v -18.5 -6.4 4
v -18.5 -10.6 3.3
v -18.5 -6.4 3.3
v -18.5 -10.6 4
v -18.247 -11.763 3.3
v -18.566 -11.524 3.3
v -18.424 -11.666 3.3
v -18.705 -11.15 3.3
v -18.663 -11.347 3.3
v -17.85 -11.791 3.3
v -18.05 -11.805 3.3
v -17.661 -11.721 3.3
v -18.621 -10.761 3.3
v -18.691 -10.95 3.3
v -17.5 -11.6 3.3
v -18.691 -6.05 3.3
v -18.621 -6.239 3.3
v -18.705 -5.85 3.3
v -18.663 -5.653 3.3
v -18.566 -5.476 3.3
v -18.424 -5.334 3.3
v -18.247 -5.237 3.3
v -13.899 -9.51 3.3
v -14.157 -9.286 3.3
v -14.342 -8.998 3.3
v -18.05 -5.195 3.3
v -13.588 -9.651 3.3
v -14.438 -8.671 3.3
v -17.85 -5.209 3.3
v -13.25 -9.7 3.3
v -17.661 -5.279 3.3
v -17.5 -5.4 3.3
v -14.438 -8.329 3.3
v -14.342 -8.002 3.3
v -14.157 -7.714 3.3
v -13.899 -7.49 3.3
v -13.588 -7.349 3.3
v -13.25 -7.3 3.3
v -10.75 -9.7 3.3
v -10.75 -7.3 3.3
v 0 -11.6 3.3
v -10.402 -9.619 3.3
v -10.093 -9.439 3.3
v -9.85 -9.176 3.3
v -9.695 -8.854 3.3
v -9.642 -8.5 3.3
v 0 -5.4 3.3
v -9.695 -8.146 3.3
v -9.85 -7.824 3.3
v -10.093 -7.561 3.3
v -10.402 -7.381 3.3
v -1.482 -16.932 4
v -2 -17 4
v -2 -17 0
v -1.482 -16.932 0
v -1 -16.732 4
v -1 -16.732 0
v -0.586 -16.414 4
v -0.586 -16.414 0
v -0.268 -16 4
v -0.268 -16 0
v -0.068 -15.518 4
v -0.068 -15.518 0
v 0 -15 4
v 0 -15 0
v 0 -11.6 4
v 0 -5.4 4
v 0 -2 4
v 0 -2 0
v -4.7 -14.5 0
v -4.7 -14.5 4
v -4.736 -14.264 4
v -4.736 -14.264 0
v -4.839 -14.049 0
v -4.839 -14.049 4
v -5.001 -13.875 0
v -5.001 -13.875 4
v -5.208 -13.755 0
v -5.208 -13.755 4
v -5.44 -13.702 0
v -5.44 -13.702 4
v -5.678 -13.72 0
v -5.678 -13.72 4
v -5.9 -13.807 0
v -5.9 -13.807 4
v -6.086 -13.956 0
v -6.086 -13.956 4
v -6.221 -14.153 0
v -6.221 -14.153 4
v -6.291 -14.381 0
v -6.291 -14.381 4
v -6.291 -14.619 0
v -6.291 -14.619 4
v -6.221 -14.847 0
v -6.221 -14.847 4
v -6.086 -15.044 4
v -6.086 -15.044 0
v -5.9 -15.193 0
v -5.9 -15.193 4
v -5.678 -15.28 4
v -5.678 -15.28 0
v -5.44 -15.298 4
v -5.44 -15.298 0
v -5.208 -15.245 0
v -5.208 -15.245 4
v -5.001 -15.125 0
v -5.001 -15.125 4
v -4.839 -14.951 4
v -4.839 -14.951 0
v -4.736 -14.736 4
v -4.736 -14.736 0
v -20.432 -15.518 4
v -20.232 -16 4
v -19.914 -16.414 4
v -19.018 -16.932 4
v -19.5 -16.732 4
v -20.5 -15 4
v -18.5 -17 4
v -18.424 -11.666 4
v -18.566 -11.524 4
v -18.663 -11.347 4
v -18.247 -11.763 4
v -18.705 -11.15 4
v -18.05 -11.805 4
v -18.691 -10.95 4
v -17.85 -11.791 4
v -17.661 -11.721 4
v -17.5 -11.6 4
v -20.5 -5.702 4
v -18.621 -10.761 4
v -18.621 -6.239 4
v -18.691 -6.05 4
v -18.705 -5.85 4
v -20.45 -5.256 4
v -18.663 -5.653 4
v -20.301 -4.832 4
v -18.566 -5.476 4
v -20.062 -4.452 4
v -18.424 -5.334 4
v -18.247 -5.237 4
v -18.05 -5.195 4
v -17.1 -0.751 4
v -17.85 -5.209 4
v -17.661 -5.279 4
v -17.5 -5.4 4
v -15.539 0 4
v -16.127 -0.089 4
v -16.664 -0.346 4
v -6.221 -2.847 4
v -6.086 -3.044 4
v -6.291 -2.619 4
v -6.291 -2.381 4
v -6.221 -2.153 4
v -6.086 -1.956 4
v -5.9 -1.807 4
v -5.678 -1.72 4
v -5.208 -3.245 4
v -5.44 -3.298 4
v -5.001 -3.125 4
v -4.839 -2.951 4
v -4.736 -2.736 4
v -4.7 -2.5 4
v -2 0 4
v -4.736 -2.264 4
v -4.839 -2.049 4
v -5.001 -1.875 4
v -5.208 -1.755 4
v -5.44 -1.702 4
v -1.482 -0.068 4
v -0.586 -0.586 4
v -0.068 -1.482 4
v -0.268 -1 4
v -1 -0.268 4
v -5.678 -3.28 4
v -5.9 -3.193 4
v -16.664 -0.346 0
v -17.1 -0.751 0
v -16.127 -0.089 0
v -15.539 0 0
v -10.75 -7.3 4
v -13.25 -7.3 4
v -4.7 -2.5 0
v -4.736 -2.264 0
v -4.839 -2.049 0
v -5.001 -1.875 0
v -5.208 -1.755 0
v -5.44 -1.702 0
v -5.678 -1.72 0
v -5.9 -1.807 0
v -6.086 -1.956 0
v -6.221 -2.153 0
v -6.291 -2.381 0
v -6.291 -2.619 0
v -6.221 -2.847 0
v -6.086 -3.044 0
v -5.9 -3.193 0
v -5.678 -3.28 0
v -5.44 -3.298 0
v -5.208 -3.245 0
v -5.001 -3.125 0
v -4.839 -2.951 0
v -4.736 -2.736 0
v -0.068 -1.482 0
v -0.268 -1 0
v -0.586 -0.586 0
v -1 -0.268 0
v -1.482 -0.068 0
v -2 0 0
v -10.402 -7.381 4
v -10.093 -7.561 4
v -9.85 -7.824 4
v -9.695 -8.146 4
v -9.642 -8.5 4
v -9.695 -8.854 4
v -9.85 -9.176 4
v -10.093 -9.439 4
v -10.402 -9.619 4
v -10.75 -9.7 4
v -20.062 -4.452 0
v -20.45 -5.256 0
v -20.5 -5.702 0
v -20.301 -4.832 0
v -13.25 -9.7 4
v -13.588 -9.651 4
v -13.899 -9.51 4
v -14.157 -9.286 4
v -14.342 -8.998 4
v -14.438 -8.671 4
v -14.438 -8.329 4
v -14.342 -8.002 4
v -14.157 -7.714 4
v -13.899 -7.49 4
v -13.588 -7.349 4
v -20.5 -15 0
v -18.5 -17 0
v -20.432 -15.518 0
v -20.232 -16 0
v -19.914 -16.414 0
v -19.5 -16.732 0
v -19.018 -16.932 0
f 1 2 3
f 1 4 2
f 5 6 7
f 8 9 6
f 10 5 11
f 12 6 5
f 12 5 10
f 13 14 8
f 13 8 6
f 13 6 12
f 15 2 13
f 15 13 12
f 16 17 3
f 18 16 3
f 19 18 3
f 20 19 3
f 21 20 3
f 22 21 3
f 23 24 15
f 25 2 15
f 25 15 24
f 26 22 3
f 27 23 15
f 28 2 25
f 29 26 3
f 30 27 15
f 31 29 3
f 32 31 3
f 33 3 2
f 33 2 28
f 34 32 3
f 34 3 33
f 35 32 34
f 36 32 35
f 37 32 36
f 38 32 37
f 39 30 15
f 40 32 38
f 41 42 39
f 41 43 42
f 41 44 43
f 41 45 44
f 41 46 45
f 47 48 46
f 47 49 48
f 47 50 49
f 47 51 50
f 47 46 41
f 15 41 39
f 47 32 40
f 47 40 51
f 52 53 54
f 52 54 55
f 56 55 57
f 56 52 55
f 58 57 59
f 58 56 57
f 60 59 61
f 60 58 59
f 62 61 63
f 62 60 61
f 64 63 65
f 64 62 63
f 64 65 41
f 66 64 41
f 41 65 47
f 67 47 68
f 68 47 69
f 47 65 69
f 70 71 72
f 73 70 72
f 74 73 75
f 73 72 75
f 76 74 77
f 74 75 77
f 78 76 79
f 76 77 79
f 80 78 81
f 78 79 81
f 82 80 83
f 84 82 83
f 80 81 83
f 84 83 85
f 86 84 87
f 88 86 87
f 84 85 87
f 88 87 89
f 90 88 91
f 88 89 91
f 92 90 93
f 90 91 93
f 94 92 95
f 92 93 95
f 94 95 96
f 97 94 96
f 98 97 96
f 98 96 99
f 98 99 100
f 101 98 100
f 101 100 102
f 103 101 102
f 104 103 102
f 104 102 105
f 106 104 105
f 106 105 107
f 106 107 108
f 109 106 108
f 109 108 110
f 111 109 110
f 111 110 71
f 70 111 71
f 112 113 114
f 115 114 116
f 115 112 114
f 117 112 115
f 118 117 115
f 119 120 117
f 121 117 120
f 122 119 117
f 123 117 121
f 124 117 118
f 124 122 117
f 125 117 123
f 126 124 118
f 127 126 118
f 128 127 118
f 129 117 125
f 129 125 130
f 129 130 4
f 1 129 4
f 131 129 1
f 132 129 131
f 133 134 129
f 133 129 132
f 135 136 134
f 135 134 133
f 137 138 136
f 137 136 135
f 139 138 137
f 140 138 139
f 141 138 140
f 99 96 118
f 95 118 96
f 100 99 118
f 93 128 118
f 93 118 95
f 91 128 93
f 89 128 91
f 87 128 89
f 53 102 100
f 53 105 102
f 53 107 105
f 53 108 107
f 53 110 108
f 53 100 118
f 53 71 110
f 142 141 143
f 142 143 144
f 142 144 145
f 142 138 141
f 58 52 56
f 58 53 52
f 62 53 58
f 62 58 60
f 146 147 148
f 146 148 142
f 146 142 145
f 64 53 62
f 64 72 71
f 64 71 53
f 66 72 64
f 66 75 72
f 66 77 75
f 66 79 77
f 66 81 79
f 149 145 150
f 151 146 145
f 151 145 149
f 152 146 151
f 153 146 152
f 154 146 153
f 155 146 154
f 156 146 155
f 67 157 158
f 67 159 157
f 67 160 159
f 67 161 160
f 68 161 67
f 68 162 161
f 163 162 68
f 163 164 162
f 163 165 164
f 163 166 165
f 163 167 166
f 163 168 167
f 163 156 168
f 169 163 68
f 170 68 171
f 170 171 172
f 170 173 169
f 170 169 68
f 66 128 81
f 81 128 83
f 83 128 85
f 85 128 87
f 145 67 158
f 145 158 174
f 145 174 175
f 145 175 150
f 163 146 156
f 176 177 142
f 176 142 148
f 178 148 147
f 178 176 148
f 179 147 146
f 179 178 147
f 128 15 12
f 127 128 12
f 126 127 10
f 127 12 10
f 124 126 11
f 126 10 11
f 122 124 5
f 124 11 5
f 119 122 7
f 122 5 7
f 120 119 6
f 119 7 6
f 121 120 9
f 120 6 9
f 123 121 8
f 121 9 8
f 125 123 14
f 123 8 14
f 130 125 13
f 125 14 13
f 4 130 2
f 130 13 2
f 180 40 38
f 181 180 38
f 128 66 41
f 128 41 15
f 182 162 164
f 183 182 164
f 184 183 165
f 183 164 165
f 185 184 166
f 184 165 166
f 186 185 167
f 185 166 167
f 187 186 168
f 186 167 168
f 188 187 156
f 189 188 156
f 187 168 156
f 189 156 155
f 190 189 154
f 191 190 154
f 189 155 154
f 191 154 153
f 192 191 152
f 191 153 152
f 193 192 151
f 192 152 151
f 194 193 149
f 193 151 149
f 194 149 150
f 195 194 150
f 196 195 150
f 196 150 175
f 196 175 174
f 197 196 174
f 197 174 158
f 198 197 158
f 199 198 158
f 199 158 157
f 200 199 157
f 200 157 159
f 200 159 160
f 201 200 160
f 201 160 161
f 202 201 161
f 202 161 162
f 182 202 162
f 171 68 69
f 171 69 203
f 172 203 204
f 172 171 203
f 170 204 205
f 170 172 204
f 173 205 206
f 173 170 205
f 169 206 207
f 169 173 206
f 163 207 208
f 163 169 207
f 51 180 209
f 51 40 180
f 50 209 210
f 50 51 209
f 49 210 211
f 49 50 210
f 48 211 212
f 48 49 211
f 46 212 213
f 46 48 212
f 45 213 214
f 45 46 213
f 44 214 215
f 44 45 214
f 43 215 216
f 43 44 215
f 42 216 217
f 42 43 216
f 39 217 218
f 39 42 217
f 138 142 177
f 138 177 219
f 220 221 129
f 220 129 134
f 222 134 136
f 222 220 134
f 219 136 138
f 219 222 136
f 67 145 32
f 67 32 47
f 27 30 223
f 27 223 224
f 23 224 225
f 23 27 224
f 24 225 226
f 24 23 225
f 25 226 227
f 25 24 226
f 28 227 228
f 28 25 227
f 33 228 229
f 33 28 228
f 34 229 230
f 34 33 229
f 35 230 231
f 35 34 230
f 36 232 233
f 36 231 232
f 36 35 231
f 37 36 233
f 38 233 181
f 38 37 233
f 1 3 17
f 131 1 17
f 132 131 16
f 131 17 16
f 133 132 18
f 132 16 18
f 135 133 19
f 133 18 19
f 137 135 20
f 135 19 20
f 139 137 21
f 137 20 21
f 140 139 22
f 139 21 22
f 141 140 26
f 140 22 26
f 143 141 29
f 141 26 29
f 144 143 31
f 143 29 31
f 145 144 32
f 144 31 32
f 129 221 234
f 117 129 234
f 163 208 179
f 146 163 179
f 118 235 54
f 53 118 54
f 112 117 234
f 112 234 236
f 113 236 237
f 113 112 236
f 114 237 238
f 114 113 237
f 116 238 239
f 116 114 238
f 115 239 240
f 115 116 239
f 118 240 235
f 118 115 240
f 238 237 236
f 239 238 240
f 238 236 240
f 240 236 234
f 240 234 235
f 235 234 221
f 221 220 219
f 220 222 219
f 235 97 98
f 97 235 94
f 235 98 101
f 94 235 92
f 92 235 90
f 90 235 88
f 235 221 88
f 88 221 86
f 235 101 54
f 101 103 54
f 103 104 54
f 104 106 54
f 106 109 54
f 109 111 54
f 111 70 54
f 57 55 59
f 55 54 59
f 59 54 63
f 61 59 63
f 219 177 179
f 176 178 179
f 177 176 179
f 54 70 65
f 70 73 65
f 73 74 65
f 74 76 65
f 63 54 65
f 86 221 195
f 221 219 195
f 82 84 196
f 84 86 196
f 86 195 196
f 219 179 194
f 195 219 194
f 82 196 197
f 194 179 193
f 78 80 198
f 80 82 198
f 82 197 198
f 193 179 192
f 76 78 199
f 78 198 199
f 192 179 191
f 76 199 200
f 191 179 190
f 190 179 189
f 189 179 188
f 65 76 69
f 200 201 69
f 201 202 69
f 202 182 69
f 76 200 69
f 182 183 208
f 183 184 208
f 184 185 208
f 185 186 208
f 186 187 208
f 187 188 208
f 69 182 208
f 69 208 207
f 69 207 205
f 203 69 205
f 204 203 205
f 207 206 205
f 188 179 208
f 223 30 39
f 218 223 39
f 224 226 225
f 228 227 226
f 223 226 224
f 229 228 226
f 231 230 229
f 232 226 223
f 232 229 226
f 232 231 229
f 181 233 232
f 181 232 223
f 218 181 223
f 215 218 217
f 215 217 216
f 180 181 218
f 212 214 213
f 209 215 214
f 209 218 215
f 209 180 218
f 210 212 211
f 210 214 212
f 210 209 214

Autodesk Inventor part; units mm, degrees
ref_plane "YZ Plane" through (0, 0, 0) normal (1, 0, 0) x (0, 1, 0)
ref_plane "XZ Plane" through (0, 0, 0) normal (0, 1, 0) x (-1, 0, 0)
ref_plane "XY Plane" through (0, 0, 0) normal (0, 0, 1) x (1, 0, 0)
sketch "スケッチ1" plane through (0, 0, 0) normal (0, 0, 1) x (1, 0, 0)
  line L0 (0, 0) -> (-20.5, 0)
  line L1 (-20.5, 0) -> (-20.5, -17)
  line L2 (-20.5, -17) -> (0, -17)
  line L3 (0, -17) -> (0, 0)
  dimension "d0" = 20.5
  dimension "d1" = 17
extrude "押し出し1" add sketch "スケッチ1" along normal blind 4
sketch "スケッチ2" plane through (0, 0, 4) normal (0, 0, 1) x (1, 0, 0)
  circle A0 centre (-5.5, -2.5) radius 0.8
  circle A1 centre (-5.5, -14.5) radius 0.8
  point P0 (0, 0)
  dimension "d4" = 1.6
  dimension "d5" = 1.6
extrude "押し出し2" cut sketch "スケッチ2" against normal blind 4
sketch "スケッチ3" plane through (0, 0, 4) normal (0, 0, 1) x (1, 0, 0)
  line L0 (0, -17) -> (0, 0) projected
  line L1 (0, -8.5) -> (0, -11.6)
  line L2 (0, -11.6) -> (-18.5, -11.6)
  line L3 (-20.5, 0) -> (-20.5, -17) projected
  line L4 (-18.5, -11.6) -> (-18.5, -5.4)
  line L5 (-18.5, -5.4) -> (0, -5.4)
  line L6 (0, -5.4) -> (0, -8.5)
  point P0 (0, -5.4)
  dimension "d8" = 3.1
  dimension "d9" = 18.5
  dimension "d10" = 6.2
extrude "押し出し3" cut sketch "スケッチ3" against normal blind 0.7
sketch "スケッチ4" plane through (0, 0, 3.3) normal (0, 0, 1) x (1, 0, 0)
  circle A0 centre (-13.25, -8.5) radius 1.2
  circle A1 centre (-10.846154, -8.5) radius 1.203846
  line L0 (-10.75, -9.7) -> (-13.25, -9.7)
  line L1 (-10.75, -7.3) -> (-13.25, -7.3)
  line L2 (-18.5, -11.6) -> (-18.5, -5.4)
  point P0 (0, 0)
  dimension "d13" = 2.4
  dimension "d16" = 5.25
  dimension "d17" = 2.5
sketch "スケッチ4 outline for 押し出し4" plane through (0, 0, 3.3) normal (0, 0, 1) x (1, 0, 0)
  line L0 (-13.25, -9.7) -> (-10.75, -9.7)
  arc A0 (-13.25, -7.3) -> (-13.25, -9.7) centre (-13.25, -8.5) ccw
  line L1 (-10.75, -7.3) -> (-13.25, -7.3)
  arc A1 (-10.75, -9.7) -> (-10.75, -7.3) centre (-10.846154, -8.5) ccw
extrude "押し出し4" add sketch "スケッチ4 outline for 押し出し4" along normal blind 0.7
sketch "スケッチ5" plane through (0, 0, 4) normal (0, 0, 1) x (1, 0, 0)
  line L0 (-20.5, -17) -> (-20.5, -12)
  line L1 (-20.5, -17) -> (-16.5, -17)
  line L2 (-20.5, 0) -> (-20.5, -5)
  line L3 (-20.5, 0) -> (-16.5, 0)
  line L4 (0, 0) -> (-20.5, 0) projected
  line L5 (-16.5, 0) -> (-20.5, -5)
  dimension "d18" = 5
  dimension "d19" = 4
  dimension "d20" = 5
  dimension "d21" = 4
extrude "押し出し5" cut sketch "スケッチ5" against normal blind 10
fillet "フィレット1" radius 2 5 edges at (-16.5, 0, 2) (-20.5, -5, 2) (-20.5, -17, 2) (0, -17, 2) (0, 0, 2)
fillet_without_effect "フィレット2"
sketch "スケッチ6" plane through (0, 0, 3.3) normal (0, 0, 1) x (1, 0, 0)
  line L0 (-18.5, -5.4) -> (0, -5.4)
  circle A0 centre (-18, -5.9) radius 0.707107
  line L1 (0, -11.6) -> (-18.5, -11.6)
  circle A1 centre (-18, -11.1) radius 0.707107
  line L2 (-18.5, -11.6) -> (-18.5, -5.4)
  point P0 (0, 0)
  dimension "d28" = 0.5
  dimension "d29" = 0.5
  dimension "d30" = 0.5
  dimension "d31" = 0.5
extrude "押し出し6" cut sketch "スケッチ6" along normal blind 0.7
properties part number "cutter_holder-2" material "ABS プラスチック"
